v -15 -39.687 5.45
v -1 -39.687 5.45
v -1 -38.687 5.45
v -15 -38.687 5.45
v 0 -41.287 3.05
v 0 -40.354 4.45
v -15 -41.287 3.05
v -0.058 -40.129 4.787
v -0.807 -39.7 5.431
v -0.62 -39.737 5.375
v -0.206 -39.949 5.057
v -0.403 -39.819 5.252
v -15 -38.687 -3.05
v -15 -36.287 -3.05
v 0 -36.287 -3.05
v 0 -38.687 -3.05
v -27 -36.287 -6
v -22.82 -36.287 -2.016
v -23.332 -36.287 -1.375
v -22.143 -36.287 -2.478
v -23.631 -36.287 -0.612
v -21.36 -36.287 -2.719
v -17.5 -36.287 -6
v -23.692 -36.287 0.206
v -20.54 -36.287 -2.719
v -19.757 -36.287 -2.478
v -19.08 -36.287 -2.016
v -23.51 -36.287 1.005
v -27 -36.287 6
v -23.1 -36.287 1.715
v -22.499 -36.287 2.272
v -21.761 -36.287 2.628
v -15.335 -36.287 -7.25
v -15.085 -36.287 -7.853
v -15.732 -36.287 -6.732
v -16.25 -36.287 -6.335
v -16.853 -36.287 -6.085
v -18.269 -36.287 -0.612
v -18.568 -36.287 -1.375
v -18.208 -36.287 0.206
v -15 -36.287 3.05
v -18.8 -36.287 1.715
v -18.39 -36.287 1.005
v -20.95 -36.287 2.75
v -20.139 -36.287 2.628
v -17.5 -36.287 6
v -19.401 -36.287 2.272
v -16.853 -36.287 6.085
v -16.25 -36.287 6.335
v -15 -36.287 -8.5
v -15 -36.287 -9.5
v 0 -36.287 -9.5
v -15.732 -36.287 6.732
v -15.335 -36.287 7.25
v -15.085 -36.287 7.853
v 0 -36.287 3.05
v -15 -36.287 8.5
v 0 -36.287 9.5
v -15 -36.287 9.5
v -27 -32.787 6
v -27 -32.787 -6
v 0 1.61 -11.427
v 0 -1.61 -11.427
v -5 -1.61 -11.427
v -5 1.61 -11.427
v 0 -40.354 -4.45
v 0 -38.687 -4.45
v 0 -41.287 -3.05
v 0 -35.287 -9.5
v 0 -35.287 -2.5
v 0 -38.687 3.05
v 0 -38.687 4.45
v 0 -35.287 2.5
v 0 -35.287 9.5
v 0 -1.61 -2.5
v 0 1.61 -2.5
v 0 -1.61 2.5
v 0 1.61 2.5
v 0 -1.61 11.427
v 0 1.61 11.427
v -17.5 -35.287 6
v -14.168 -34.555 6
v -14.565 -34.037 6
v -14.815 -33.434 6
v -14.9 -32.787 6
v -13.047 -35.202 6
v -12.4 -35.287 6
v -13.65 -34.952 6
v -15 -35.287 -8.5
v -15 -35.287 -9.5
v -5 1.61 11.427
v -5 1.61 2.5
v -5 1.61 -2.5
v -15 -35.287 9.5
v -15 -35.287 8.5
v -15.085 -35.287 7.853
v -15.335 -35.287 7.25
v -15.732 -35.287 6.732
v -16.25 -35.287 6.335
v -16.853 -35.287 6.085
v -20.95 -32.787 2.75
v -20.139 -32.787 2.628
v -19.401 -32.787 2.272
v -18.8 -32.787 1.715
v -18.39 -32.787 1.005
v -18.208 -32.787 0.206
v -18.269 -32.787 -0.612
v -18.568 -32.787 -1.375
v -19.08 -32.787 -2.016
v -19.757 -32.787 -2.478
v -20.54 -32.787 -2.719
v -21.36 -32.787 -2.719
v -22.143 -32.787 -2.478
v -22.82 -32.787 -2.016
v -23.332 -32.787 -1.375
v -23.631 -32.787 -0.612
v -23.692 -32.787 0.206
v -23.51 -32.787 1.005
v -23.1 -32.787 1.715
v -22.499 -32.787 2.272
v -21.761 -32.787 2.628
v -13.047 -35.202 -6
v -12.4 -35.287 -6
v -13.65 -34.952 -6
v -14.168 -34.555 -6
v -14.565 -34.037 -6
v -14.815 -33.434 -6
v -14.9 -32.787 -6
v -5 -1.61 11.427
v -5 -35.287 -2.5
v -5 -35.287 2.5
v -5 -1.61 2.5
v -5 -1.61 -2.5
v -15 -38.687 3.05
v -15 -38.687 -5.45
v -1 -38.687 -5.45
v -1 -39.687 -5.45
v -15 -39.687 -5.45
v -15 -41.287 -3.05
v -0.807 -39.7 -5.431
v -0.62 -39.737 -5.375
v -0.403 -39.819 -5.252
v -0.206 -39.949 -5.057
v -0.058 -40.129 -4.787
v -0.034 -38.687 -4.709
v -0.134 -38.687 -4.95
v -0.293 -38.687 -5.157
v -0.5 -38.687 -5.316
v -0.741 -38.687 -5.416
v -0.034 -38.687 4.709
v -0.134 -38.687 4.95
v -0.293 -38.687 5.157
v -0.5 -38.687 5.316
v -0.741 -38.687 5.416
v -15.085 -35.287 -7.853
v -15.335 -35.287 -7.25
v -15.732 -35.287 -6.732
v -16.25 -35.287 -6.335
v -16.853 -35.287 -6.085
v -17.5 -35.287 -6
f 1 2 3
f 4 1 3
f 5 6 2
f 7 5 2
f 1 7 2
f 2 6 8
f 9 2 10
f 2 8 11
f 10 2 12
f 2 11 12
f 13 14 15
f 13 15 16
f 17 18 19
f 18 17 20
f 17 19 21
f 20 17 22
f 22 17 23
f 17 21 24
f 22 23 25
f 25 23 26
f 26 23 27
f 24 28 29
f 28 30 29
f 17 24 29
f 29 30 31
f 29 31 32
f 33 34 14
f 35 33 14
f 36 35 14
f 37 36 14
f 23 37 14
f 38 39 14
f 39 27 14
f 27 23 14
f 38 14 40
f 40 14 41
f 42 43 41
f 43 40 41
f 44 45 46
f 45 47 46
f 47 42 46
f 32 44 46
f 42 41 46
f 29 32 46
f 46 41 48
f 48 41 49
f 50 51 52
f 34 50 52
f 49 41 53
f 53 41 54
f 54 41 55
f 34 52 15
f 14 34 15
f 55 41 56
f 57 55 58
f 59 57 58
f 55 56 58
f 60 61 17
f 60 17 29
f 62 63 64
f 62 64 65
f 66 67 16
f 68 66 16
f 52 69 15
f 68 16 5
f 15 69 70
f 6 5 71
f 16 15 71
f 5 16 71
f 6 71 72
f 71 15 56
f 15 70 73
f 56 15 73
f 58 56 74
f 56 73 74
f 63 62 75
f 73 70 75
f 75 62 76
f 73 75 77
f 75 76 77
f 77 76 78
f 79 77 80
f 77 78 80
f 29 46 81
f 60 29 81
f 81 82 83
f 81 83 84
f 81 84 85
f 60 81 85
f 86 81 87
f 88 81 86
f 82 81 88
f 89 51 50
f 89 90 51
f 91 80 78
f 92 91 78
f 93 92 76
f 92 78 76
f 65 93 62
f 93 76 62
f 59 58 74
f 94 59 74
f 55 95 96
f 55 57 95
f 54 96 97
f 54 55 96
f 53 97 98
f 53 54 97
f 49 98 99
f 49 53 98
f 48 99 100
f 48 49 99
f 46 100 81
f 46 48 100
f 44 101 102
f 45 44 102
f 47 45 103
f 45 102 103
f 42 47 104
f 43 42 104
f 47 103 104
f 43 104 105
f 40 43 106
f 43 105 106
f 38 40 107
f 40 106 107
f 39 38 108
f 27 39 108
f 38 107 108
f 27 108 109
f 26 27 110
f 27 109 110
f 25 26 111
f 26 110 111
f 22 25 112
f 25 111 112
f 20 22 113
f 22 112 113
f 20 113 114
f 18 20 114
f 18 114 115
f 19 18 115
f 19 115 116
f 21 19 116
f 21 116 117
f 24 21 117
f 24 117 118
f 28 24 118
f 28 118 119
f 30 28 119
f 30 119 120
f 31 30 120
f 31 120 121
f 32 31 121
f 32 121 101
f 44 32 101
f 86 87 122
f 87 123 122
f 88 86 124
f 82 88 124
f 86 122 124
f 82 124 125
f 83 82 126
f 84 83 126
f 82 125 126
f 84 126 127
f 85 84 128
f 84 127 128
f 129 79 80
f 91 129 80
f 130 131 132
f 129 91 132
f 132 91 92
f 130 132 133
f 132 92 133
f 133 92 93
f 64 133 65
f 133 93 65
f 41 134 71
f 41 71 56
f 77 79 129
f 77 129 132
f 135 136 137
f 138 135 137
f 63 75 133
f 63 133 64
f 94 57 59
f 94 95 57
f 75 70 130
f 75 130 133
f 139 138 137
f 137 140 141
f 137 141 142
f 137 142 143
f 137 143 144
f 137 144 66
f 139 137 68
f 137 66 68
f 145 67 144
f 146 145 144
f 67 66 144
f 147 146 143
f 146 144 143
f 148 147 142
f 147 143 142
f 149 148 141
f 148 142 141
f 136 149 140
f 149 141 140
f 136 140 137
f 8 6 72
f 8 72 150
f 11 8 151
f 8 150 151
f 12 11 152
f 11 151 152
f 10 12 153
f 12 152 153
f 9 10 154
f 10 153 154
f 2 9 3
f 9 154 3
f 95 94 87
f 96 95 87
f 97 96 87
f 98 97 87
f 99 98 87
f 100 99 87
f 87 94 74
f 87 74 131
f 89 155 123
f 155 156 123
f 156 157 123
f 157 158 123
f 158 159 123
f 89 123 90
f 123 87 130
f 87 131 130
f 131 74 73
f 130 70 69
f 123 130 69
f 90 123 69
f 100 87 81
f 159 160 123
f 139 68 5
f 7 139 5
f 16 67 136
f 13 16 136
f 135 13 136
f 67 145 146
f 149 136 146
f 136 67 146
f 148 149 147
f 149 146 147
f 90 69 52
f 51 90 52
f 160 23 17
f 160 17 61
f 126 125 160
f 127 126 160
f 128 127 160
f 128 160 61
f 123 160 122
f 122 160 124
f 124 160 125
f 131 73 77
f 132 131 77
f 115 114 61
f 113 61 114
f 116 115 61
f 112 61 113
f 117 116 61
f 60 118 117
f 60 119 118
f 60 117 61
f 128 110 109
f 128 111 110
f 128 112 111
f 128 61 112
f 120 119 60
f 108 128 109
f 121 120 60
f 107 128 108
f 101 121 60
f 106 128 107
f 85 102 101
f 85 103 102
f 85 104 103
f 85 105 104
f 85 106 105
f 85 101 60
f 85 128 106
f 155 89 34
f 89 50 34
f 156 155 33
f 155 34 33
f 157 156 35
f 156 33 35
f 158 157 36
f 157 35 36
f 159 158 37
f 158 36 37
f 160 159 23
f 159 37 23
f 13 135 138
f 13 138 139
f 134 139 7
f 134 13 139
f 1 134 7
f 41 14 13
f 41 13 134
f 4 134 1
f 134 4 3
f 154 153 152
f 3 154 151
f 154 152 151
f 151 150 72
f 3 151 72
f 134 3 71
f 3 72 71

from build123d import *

# Parameters (mm, degrees)
SKETCH1_W                 = 22.85439833
SKETCH1_H                 = 3.220407414
BOSS_EXTRUDE1_DEPTH       = 5
SKETCH2_W                 = 5
SKETCH2_H                 = 37.897484117
BOSS_EXTRUDE2_DEPTH       = 5
BOSS_EXTRUDE3_DEPTH       = 15
FILLET1_R                 = 1
BOSS_EXTRUDE28_DEPTH      = 12
BOSS_EXTRUDE28_DEPTH_BACK = 0.1
SKETCH38_W                = 12
SKETCH38_H                = 3.5
CUT_EXTRUDE3_REACH        = 47.197
SKETCH39_R                = 2.75
FILLET2_R                 = 2.5


with BuildPart() as part:
    # Sketch1 → Boss-Extrude1 (new body)
    with BuildSketch(Plane(origin=(0, 0, 0), x_dir=(0, 0, -1), z_dir=(1, 0, 0))):
        Rectangle(SKETCH1_W, SKETCH1_H)
    extrude(amount=-BOSS_EXTRUDE1_DEPTH)

    # Sketch2 → Boss-Extrude2 (add)
    with BuildSketch(Plane(origin=(0, 0, 0), x_dir=(0, 0, -1), z_dir=(1, 0, 0))):
        with Locations((0, -17.338538351)):
            Rectangle(SKETCH2_W, SKETCH2_H)
    extrude(amount=-BOSS_EXTRUDE2_DEPTH)

    # Sketch3 → Boss-Extrude3 (add)
    with BuildSketch(Plane(origin=(0, 0, 0), x_dir=(0, 0, -1), z_dir=(1, 0, 0))):
        Polygon((-9.5, -36.28728041), (-9.5, -35.28728041), (9.5, -35.28728041), (9.5, -36.28728041), (3.05, -36.28728041), (3.05, -38.68728041), (5.45, -38.68728041), (5.45, -39.68728041), (3.05, -41.28728041), (-3.05, -41.28728041), (-5.45, -39.68728041), (-5.45, -38.68728041), (-3.05, -38.68728041), (-3.05, -36.28728041), align=None)
    extrude(amount=-BOSS_EXTRUDE3_DEPTH)

    # Fillet1
    fillet1_edges = [part.edges().sort_by_distance(p)[0] for p in [
        (0, -39.18728041, 5.45),
        (0, -39.18728041, -5.45),
    ]]
    fillet(fillet1_edges, radius=FILLET1_R)

    # Sketch38 → Boss-Extrude28 (add, two sides: drawn at the far end of the back side and taken through both)
    with BuildSketch(Plane.ZY.offset(15).offset(-BOSS_EXTRUDE28_DEPTH_BACK)):
        with Locations((0, -34.53728041)):
            Rectangle(SKETCH38_W, SKETCH38_H)
    extrude(amount=BOSS_EXTRUDE28_DEPTH + BOSS_EXTRUDE28_DEPTH_BACK)

    # Sketch39 → Cut-Extrude3 (cut, up to next)
    with BuildSketch(Plane(origin=(0, -32.78728041, 0), x_dir=(1, 0, 0), z_dir=(0, 1, 0)), mode=Mode.PRIVATE) as cut_extrude3_sk1:
        with Locations(Location((-20.95, 0, 0), (0, 0, 270))):
            Circle(SKETCH39_R)
    cut_extrude3_tool1 = extrude(cut_extrude3_sk1.sketch, amount=-CUT_EXTRUDE3_REACH, mode=Mode.PRIVATE) & part.part
    add(cut_extrude3_tool1.solids().sort_by_distance((-20.95, -32.78728, 0))[0], mode=Mode.SUBTRACT)

    # Fillet2
    fillet2_edges = [part.edges().sort_by_distance(p)[0] for p in [
        (-14.9, -35.28728041, 0),
        (-15, -35.78728041, -6),
        (-15, -35.78728041, 6),
    ]]
    fillet(fillet2_edges, radius=FILLET2_R - 0.0001)  # a hair under: the kernel refuses the full size


solid = part.part
